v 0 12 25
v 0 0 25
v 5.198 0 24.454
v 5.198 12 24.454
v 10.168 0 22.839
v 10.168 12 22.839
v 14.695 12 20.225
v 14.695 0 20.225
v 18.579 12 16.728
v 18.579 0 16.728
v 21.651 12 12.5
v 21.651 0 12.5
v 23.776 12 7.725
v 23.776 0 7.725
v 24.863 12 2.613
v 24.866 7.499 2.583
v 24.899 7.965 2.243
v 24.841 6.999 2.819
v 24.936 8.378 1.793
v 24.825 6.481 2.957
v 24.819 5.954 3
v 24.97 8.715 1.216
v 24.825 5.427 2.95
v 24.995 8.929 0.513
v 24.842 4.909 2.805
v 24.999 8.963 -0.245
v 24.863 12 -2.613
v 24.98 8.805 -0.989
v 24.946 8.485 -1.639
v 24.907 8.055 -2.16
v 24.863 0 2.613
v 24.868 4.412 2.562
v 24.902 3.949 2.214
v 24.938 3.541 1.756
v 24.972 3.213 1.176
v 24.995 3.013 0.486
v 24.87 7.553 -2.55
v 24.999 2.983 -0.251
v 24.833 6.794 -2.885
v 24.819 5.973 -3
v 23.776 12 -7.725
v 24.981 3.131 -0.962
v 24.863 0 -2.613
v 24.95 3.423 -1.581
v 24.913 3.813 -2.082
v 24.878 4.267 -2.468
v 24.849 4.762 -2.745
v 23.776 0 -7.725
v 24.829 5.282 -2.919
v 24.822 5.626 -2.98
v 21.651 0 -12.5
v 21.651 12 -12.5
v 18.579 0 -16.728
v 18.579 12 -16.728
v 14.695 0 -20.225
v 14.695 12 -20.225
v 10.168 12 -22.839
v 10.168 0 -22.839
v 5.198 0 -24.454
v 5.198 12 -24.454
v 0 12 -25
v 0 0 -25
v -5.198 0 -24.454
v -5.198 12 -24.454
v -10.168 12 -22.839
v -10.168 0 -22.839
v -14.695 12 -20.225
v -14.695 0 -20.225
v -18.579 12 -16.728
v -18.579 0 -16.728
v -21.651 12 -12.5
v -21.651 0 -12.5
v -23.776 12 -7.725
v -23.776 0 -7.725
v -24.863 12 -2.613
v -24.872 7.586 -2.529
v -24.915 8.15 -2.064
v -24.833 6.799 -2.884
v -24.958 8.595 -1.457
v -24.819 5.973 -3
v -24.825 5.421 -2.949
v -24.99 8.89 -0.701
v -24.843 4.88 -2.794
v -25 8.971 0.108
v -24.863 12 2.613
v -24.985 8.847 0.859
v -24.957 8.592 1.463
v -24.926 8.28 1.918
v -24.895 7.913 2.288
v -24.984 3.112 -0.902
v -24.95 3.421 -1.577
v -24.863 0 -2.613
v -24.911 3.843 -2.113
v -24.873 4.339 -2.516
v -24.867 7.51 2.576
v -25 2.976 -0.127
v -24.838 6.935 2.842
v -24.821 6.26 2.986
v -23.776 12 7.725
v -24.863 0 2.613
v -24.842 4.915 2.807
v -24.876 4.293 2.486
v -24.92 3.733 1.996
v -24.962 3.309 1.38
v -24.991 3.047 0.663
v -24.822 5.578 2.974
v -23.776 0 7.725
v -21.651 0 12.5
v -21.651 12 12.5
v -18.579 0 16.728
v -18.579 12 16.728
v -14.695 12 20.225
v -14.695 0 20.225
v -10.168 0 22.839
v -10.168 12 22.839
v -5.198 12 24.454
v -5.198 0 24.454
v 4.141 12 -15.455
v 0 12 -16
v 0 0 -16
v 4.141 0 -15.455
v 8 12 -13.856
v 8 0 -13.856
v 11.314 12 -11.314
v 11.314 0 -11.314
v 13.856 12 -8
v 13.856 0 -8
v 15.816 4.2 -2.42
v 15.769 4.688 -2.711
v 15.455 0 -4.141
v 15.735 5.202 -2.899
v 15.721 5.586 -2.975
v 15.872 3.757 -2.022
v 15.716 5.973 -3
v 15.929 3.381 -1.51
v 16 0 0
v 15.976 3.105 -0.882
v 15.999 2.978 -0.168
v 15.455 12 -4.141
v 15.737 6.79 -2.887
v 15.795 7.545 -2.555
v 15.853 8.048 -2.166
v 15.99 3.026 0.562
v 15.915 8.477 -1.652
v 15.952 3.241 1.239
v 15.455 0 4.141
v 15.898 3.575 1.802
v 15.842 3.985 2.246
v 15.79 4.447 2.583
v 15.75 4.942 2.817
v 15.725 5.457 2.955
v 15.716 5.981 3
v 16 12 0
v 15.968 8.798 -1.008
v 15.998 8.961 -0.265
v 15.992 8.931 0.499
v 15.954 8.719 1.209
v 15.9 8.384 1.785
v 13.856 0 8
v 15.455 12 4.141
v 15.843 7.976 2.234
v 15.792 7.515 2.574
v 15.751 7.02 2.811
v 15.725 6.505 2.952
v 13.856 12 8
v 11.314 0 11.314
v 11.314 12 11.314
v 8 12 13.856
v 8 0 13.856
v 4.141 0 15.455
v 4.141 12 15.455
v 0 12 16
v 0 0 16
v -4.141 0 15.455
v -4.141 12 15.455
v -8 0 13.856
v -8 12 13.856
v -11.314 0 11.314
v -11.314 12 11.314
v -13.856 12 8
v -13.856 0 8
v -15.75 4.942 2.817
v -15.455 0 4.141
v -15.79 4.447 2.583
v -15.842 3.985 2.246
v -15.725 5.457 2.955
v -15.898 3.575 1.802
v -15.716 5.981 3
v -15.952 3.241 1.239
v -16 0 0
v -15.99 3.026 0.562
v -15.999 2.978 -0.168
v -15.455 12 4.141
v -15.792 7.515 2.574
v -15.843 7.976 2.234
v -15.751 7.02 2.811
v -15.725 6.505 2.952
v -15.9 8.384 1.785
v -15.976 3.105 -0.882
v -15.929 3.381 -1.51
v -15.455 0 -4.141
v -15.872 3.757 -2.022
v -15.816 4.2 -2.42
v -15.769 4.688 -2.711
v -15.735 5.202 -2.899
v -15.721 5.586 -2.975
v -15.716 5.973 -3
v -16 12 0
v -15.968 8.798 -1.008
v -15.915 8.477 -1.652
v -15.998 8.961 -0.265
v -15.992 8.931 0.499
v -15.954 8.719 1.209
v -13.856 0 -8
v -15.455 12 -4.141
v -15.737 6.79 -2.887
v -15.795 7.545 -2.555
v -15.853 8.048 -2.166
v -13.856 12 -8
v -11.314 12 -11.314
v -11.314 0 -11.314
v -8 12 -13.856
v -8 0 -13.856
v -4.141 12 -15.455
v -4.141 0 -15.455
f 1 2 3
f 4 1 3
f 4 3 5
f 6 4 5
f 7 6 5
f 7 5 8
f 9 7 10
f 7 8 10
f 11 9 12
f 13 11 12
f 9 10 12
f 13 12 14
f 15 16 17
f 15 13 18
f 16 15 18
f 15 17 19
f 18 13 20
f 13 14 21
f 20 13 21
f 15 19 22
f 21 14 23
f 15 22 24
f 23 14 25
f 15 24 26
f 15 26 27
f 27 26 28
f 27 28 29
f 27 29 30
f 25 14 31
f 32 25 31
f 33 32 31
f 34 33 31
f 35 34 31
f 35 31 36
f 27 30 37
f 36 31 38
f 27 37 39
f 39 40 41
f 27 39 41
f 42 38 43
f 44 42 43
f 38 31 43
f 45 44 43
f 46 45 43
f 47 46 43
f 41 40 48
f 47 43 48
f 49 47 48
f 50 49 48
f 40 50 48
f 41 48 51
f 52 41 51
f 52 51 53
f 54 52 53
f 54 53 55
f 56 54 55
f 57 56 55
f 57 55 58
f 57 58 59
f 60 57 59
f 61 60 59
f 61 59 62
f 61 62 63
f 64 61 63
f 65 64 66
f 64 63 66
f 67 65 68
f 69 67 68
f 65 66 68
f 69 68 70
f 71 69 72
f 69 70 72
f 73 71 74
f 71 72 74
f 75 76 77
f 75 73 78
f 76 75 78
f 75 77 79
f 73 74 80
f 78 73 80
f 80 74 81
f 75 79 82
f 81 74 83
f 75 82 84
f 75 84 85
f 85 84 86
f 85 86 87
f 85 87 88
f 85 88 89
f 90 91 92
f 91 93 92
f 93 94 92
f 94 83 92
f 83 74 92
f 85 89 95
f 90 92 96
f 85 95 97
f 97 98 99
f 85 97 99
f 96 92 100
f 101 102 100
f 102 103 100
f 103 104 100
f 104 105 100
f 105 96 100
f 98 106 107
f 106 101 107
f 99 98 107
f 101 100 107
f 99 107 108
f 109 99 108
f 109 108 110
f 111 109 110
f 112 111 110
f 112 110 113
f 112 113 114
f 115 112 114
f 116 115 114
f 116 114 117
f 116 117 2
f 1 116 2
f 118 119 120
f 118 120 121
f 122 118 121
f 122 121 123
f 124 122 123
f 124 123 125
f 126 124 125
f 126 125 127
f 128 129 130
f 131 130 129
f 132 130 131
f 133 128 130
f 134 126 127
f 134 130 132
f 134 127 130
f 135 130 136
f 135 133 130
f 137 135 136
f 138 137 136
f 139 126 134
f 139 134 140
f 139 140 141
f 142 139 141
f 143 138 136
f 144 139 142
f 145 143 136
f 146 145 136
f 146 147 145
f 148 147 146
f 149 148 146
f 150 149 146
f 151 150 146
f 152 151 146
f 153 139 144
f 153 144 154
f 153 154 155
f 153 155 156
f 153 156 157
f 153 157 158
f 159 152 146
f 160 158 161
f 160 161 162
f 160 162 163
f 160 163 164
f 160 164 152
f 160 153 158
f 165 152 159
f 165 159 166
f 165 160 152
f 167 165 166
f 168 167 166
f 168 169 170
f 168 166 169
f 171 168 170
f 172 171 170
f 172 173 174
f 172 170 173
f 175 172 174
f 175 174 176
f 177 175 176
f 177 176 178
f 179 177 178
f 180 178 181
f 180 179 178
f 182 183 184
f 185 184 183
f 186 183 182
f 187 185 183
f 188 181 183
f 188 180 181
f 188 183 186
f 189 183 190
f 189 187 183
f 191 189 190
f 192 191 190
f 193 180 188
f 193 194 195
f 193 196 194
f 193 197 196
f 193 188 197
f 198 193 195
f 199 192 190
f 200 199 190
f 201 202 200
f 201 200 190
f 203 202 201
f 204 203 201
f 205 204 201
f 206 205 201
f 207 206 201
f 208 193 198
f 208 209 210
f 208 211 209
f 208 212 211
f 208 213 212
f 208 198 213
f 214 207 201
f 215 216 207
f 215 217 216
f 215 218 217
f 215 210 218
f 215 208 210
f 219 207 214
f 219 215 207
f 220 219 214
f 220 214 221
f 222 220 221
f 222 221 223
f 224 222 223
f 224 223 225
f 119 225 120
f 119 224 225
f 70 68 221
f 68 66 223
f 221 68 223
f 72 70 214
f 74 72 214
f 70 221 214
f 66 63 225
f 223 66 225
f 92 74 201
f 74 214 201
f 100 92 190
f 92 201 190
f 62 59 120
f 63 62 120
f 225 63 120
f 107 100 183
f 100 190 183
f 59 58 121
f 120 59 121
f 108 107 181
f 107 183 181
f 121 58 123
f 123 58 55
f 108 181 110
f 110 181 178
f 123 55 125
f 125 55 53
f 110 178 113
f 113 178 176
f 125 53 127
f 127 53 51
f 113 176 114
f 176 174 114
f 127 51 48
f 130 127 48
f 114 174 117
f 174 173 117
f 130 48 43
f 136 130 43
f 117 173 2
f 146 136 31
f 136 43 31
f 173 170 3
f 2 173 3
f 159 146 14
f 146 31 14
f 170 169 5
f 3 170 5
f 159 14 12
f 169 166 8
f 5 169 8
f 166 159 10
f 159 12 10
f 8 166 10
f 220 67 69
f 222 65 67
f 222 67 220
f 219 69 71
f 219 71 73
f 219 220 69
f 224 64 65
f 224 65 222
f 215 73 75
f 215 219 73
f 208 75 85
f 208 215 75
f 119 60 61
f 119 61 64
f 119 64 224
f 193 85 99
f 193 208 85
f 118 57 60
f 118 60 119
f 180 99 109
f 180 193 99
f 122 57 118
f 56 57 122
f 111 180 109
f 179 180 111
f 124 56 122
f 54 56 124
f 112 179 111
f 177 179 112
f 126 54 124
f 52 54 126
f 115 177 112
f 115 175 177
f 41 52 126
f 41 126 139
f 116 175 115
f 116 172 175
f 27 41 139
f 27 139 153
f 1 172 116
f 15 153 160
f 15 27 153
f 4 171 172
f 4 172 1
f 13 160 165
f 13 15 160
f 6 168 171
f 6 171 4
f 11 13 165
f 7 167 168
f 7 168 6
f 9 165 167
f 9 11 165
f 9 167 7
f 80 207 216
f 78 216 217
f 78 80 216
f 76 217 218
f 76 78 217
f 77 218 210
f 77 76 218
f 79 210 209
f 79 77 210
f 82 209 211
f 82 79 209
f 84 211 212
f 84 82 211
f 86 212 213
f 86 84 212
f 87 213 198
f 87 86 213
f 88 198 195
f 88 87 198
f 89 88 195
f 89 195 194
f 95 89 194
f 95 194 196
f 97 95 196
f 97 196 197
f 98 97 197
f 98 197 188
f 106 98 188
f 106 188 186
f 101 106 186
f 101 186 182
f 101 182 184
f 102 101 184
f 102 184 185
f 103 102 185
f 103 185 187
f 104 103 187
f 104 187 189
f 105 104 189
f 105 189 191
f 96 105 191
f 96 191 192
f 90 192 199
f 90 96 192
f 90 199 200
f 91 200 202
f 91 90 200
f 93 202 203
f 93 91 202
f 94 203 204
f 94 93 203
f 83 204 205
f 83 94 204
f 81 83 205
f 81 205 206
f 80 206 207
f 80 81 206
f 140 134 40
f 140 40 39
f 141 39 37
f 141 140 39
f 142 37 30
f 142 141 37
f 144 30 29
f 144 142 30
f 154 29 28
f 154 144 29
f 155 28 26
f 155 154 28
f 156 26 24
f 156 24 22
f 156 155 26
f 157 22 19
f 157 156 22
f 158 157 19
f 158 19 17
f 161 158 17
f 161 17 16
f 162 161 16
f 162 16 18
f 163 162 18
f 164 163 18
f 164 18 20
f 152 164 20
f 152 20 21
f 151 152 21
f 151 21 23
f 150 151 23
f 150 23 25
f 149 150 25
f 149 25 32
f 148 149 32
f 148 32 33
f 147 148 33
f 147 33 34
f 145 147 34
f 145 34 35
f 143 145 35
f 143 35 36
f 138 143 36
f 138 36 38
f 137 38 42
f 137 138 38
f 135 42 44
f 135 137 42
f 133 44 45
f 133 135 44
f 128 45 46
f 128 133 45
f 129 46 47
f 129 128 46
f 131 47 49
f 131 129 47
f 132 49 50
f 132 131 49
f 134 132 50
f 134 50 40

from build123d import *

# Parameters (mm, degrees)
SKETCH2_R               = 25
BOSS_EXTRUDE1_DEPTH     = 12
CUT_EXTRUDE1_DEPTH      = 38.336309405
CUT_EXTRUDE1_DEPTH_BACK = 38.336309405
SKETCH3_R               = 3
CUT_EXTRUDE2_DEPTH      = 38.33630958
CUT_EXTRUDE2_DEPTH_BACK = 38.33630958
SKETCH4_R               = 16


with BuildPart() as part:
    # Sketch2 → Boss-Extrude1 (new body)
    with BuildSketch(Plane(origin=(0, 0, 0), x_dir=(1, 0, 0), z_dir=(0, 1, 0))):
        with Locations(Location((0, 0, 0), (0, 0, 270))):
            Circle(SKETCH2_R)
    extrude(amount=BOSS_EXTRUDE1_DEPTH)

    # Sketch3 → Cut-Extrude1 (cut, two sides: drawn at the far end of the back side and taken through both)
    with BuildSketch(Plane(origin=(0, 0, 0), x_dir=(0, 0, -1), z_dir=(1, 0, 0)).offset(-CUT_EXTRUDE1_DEPTH_BACK)):
        with Locations((0, 5.972869538)):
            Circle(SKETCH3_R)
    extrude(amount=CUT_EXTRUDE1_DEPTH + CUT_EXTRUDE1_DEPTH_BACK, mode=Mode.SUBTRACT)

    # Sketch4 → Cut-Extrude2 (cut, two sides: drawn at the far end of the back side and taken through both)
    with BuildSketch(Plane.XZ.offset(-CUT_EXTRUDE2_DEPTH_BACK)):
        with Locations(Location((0, 0, 0), (0, 0, 270))):
            Circle(SKETCH4_R)
    extrude(amount=CUT_EXTRUDE2_DEPTH + CUT_EXTRUDE2_DEPTH_BACK, mode=Mode.SUBTRACT)


solid = part.part
